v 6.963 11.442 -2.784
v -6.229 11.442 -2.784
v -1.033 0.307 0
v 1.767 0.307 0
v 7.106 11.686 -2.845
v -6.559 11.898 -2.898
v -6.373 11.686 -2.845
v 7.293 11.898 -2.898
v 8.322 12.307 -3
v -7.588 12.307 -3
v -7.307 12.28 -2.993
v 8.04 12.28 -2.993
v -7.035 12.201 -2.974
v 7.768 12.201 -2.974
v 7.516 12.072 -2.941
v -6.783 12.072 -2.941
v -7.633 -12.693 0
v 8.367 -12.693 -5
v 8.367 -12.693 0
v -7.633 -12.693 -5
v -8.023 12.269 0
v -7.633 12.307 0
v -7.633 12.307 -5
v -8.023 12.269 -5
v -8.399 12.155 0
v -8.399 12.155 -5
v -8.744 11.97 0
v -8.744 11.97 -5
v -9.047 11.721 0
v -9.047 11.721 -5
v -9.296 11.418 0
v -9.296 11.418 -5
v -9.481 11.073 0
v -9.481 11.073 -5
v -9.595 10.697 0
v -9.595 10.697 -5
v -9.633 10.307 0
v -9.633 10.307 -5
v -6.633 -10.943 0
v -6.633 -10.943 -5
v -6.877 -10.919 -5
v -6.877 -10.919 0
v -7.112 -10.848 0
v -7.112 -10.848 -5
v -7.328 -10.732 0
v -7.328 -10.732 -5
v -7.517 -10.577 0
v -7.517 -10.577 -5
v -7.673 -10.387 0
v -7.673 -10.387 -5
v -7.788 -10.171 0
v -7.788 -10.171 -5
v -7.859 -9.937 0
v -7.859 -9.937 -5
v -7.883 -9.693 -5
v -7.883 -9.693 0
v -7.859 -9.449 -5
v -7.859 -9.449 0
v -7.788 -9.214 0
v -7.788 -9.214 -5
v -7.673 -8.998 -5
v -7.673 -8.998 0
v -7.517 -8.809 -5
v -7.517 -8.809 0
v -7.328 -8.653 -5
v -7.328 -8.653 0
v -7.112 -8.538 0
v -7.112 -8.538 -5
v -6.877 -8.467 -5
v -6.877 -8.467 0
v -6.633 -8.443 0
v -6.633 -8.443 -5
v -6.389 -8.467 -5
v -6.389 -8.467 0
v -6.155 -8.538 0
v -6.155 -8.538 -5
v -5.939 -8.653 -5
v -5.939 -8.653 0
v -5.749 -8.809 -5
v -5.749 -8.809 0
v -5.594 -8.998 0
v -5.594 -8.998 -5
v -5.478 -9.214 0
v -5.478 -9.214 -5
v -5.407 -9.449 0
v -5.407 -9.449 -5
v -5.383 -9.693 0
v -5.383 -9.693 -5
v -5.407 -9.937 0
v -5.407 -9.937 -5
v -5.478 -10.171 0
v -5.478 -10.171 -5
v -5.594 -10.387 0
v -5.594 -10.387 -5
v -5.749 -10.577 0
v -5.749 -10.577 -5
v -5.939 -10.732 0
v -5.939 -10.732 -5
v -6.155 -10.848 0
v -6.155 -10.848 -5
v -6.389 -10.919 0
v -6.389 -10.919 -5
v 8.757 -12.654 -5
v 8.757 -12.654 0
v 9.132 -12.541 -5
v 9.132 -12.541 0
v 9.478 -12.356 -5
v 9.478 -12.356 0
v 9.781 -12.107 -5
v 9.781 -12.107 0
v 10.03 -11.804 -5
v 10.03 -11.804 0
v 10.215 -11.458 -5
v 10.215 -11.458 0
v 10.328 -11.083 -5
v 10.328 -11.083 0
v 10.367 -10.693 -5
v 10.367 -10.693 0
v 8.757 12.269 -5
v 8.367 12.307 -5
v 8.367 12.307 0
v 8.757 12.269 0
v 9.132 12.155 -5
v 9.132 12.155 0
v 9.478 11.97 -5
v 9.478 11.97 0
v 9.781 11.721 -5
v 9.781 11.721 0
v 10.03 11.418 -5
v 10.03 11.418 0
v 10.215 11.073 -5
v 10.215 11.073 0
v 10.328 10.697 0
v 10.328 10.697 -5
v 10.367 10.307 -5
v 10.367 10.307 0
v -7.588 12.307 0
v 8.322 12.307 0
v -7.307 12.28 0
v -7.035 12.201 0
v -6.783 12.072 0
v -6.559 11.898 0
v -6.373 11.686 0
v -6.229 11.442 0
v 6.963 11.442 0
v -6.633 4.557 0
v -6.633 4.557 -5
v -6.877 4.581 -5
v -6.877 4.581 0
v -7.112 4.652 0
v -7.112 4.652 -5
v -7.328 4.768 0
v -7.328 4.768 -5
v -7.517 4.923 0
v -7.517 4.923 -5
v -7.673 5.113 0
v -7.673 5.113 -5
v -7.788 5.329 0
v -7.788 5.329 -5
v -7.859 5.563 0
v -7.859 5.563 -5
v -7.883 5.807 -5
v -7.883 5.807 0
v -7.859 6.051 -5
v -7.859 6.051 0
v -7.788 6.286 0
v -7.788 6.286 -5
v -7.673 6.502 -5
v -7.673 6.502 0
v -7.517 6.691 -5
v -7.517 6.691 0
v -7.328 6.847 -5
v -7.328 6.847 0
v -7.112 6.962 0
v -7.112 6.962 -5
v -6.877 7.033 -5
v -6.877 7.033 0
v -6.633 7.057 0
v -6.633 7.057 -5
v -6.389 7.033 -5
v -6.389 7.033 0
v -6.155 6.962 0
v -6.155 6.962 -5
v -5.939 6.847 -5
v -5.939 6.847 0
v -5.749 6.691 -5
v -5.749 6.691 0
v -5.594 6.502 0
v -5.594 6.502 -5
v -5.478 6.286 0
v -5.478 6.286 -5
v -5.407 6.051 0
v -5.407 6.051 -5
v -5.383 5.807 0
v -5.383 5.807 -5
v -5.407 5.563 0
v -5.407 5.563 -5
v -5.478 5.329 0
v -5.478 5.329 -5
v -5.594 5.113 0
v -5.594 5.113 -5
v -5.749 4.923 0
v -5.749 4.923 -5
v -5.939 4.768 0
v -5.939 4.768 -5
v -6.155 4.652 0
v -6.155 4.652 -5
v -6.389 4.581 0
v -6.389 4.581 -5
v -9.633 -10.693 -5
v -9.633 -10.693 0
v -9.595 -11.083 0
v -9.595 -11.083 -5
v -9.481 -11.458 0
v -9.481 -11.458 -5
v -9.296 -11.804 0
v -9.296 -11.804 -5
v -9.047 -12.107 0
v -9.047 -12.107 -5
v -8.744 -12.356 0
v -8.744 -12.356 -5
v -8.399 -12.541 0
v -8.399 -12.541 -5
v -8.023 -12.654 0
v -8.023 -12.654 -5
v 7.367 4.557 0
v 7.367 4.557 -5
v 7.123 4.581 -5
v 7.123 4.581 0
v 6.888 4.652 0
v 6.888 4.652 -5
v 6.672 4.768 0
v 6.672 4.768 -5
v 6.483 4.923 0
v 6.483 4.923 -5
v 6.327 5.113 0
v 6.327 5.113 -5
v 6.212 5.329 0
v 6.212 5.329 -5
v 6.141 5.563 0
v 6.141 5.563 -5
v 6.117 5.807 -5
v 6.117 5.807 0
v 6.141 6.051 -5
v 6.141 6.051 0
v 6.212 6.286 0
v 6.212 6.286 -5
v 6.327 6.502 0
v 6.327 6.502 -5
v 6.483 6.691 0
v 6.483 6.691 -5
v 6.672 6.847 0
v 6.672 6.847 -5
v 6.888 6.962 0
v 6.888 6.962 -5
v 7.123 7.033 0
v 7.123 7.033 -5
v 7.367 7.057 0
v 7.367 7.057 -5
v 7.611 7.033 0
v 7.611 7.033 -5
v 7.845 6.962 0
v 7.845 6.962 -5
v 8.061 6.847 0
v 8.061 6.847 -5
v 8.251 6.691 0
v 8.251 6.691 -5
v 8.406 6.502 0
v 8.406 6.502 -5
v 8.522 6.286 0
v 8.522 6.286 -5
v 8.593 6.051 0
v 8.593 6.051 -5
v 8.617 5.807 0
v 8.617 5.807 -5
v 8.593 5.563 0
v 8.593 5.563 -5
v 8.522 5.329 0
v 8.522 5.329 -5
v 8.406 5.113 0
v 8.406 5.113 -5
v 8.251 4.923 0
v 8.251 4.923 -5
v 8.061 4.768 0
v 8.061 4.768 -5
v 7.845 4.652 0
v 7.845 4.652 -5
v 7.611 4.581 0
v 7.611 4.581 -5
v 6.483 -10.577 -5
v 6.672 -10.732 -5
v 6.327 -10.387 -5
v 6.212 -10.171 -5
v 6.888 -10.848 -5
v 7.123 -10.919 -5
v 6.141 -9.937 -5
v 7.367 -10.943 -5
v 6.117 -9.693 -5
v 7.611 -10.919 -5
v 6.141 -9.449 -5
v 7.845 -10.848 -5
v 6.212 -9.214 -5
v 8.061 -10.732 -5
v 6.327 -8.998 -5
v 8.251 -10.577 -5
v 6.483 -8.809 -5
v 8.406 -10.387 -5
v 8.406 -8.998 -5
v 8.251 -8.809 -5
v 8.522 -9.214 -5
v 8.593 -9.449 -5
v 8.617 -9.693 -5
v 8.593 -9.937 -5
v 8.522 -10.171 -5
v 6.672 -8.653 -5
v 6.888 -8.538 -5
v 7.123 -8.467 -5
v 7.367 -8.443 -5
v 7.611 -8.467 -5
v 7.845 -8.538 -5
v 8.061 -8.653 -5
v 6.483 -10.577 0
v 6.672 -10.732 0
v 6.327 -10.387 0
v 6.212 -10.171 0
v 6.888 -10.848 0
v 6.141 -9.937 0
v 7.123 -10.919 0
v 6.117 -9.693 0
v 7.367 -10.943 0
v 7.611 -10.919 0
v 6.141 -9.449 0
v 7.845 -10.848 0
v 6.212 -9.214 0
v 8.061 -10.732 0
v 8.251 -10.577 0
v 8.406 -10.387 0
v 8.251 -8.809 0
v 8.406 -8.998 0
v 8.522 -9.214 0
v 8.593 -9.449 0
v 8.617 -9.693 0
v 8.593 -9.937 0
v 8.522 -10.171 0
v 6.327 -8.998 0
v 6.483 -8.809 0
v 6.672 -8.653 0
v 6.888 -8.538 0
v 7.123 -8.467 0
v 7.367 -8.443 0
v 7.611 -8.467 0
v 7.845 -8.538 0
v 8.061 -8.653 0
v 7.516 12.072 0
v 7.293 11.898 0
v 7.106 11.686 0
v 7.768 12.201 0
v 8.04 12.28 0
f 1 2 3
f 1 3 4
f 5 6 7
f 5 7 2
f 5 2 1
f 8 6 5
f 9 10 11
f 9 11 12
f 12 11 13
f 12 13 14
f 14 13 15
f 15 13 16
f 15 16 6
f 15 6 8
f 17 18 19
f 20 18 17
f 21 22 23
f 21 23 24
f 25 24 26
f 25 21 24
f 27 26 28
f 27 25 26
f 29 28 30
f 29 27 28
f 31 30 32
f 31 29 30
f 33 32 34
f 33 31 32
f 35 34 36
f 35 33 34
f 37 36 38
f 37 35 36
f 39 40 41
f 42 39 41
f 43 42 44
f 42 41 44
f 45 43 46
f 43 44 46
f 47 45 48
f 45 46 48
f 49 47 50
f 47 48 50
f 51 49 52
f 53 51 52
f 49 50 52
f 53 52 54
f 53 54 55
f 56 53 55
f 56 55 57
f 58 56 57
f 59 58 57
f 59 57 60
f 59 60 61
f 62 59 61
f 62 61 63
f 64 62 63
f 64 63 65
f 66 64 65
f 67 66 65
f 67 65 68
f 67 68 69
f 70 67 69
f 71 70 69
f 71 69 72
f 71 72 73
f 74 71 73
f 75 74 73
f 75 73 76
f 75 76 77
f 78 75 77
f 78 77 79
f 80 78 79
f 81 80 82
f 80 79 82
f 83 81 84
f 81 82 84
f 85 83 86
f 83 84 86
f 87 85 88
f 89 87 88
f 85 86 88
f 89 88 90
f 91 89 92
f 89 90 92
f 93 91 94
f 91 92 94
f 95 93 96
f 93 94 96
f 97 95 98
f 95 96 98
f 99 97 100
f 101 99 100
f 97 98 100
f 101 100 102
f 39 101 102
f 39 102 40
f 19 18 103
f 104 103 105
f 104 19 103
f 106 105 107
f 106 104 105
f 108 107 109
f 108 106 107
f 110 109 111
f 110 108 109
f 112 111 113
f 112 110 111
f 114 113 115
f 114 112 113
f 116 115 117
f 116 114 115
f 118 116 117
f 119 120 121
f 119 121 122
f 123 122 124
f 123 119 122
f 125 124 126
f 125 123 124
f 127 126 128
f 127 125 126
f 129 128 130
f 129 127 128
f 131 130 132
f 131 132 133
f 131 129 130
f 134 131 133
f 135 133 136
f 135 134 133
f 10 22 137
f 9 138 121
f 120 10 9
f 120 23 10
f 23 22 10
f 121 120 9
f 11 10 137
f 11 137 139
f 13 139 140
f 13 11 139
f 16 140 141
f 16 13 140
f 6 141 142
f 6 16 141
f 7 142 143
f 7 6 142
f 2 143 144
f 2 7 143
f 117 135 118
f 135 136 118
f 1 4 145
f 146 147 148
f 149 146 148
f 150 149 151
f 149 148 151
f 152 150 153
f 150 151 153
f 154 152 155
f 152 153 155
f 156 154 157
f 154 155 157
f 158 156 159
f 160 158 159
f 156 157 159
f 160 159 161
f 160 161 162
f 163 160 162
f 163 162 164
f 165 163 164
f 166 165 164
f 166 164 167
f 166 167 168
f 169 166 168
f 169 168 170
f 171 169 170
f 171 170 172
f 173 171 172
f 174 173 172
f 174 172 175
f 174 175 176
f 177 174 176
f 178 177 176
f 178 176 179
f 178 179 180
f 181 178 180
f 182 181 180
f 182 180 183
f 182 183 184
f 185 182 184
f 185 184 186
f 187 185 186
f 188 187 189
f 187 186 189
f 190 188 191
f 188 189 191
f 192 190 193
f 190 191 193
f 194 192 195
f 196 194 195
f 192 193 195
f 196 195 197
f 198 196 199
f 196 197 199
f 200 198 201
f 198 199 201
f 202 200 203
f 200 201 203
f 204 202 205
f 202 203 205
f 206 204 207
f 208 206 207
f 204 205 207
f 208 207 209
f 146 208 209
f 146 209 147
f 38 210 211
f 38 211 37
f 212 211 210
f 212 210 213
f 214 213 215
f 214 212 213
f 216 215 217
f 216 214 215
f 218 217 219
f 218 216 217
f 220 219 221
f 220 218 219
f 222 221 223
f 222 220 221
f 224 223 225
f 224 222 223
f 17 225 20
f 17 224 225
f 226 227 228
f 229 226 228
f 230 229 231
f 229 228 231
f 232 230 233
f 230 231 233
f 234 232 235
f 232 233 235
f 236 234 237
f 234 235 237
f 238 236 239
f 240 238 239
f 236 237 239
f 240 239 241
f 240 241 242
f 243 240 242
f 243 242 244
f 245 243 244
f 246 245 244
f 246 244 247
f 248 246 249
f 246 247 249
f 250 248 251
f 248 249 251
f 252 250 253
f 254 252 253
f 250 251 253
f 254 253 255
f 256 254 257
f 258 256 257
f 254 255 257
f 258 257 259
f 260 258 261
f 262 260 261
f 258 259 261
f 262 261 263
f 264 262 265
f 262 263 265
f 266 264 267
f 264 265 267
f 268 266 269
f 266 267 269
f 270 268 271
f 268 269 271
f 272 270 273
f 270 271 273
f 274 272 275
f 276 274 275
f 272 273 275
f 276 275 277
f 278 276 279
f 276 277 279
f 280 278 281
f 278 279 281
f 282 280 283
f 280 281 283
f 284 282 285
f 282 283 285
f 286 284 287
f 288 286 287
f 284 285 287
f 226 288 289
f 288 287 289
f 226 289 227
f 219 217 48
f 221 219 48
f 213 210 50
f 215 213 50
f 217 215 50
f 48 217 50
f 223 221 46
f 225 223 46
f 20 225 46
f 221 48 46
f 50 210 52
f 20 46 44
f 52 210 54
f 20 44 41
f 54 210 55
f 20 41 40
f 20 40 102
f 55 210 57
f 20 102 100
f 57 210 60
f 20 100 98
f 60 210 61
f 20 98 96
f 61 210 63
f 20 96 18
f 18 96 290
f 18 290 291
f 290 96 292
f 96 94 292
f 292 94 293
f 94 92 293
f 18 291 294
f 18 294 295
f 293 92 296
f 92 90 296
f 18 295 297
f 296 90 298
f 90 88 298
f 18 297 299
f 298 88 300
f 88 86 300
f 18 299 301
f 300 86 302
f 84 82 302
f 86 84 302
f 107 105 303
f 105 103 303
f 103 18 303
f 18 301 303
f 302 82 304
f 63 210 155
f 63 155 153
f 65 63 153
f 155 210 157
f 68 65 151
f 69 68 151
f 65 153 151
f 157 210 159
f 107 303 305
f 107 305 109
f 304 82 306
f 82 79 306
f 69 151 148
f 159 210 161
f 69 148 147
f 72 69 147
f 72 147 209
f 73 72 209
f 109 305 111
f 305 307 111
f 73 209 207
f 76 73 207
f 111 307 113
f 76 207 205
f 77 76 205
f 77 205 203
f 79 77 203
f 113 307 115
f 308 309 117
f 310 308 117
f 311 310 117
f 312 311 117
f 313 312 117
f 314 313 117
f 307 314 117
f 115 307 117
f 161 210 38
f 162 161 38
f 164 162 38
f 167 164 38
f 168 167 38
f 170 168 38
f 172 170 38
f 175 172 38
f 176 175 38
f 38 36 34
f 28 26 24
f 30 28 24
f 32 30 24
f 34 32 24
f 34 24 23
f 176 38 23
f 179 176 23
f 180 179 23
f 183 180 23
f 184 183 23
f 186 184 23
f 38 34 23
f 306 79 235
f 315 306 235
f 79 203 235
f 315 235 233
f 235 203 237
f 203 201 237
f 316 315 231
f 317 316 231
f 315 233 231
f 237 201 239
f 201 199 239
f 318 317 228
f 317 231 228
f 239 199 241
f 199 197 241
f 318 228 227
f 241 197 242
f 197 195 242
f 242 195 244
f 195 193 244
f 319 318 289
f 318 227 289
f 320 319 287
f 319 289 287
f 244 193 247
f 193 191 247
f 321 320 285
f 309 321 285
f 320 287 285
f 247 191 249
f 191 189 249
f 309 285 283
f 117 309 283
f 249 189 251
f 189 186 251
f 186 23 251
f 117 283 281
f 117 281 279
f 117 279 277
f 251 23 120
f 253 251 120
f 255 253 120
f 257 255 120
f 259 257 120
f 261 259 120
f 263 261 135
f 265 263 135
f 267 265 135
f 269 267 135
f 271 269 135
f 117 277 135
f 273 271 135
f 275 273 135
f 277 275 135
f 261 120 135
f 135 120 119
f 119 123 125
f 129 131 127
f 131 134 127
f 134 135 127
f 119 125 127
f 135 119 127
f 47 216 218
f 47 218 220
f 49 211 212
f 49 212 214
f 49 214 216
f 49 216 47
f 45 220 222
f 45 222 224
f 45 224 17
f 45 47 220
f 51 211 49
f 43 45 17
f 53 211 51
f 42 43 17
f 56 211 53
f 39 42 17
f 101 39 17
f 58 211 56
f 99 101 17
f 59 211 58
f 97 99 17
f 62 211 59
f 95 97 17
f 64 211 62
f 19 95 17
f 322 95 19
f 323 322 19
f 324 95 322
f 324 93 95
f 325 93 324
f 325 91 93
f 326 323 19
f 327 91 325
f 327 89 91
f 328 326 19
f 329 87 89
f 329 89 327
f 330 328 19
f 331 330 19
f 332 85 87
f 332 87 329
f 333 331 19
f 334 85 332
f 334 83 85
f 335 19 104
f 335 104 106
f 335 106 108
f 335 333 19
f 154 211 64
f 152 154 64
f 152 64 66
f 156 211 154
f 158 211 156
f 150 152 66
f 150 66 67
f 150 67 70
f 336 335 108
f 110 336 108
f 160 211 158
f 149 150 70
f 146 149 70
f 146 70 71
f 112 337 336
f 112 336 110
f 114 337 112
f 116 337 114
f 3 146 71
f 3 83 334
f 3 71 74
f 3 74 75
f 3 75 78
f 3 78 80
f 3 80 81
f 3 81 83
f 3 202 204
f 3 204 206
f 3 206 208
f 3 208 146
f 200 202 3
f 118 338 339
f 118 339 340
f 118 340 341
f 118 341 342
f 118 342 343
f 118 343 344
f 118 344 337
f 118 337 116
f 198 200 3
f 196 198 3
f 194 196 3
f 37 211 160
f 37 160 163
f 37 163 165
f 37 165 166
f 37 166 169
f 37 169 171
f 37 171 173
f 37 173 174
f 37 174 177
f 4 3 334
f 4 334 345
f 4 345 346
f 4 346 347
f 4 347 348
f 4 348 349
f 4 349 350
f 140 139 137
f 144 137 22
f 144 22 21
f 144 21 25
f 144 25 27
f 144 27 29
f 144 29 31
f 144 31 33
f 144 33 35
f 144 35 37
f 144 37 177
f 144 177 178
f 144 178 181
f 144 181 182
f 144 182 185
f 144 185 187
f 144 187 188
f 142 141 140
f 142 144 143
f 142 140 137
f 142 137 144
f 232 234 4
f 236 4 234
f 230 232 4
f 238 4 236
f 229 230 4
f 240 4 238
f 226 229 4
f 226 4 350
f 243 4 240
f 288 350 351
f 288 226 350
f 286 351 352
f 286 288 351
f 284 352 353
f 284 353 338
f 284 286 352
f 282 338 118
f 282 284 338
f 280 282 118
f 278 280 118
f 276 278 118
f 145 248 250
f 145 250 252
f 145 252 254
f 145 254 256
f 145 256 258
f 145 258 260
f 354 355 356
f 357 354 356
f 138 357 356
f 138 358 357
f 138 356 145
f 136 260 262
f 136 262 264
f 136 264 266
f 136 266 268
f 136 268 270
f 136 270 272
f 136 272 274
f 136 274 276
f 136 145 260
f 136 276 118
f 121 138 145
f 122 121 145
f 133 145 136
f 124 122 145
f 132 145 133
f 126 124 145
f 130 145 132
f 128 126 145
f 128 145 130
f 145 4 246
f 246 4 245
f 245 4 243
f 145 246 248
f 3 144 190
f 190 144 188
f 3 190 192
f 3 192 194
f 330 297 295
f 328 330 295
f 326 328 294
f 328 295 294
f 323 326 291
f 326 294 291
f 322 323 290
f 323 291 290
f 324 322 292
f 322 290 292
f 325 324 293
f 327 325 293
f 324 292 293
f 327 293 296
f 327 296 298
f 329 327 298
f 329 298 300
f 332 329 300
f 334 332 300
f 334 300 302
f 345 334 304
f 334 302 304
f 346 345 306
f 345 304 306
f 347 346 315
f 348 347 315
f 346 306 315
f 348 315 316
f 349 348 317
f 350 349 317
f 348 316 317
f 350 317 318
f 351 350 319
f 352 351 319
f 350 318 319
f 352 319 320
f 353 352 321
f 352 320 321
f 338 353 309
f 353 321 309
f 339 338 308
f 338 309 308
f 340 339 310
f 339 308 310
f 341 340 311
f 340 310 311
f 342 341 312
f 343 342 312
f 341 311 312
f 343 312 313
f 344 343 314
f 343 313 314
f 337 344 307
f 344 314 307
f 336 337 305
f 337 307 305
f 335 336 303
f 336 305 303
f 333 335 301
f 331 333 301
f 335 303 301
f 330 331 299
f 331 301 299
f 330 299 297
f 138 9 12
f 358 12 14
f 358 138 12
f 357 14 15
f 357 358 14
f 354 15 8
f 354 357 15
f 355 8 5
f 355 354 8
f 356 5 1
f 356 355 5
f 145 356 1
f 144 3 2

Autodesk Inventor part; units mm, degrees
ref_plane "YZ Plane" through (0, 0, 0) normal (1, 0, 0) x (0, 1, 0)
ref_plane "XZ Plane" through (0, 0, 0) normal (0, 1, 0) x (-1, 0, 0)
ref_plane "XY Plane" through (0, 0, 0) normal (0, 0, 1) x (1, 0, 0)
sketch "Sketch1" plane through (0, 0, 0) normal (0, 0, 1) x (1, 0, 0)
  line L0 (-9.6332, 12.3072) -> (10.3668, 12.3072)
  line L1 (10.3668, 12.3072) -> (10.3668, -12.6928)
  line L2 (10.3668, -12.6928) -> (-9.6332, -12.6928)
  line L3 (-9.6332, -12.6928) -> (-9.6332, 12.3072)
  line L4 (-4.3832, -2.6928) -> (5.1168, -2.6928)
  line L5 (5.1168, -2.6928) -> (5.1168, -7.7928)
  line L6 (5.1168, -7.7928) -> (-4.3832, -7.7928)
  line L7 (-4.3832, -7.7928) -> (-4.3832, -2.6928)
  line L8 (-1.0332, -2.6928) -> (-1.0332, -7.7928)
  line L9 (1.7668, -2.6928) -> (1.7668, -7.7928)
  line L10 (-1.0332, -2.6928) -> (-1.0332, 0.3072)
  line L11 (1.7668, -2.6928) -> (1.7668, 0.3072)
  line L12 (-1.0332, 0.3072) -> (-6.6332, 12.3072)
  line L13 (1.7668, 0.3072) -> (7.3668, 12.3072)
  line L14 (-1.0332, -7.7928) -> (-1.0332, -12.6928)
  line L15 (1.7668, -7.7928) -> (1.7668, -12.6928)
  point P0 (0, 0)
  dimension "d0" = 20
  dimension "d1" = 25
  dimension "d2" = 3.35
  dimension "d3" = 3.35
  dimension "d4" = 2.8
  dimension "d5" = 5.1
  dimension "d6" = 5.25
  dimension "d7" = 9.5
  dimension "d9" = 15
  dimension "d10" = 4.9
  dimension "d11" = 3
  dimension "d12" = 3
  dimension "d13" = 3
  dimension "d14" = 3
extrude "Extrusion1" add sketch "Sketch1" along normal blind 3 contours L0 L12 L10 L4 L7 L6 L14 L2 L3 | L0 L1 L2 L15 L6 L5 L4 L11 L13
extrude "Extrusion2" add sketch "Sketch1" against normal blind 5
chamfer "Chamfer1" distance 12 distance2 3 1 edges at (0.3668, 12.3072, 0) measured on face at (-0.0999, 8.3072, 0)
sketch "Sketch3" plane through (0, 0, 3) normal (0, 0, 1) x (1, 0, 0)
  line L0 (-9.6332, 12.3072) -> (-9.6332, -12.6928) projected
  line L1 (-9.6332, -12.6928) -> (-1.0332, -12.6928) projected
  line L2 (-1.0332, -12.6928) -> (-1.0332, -7.7928) projected
  line L3 (-1.0332, -7.7928) -> (-4.3832, -7.7928) projected
  line L4 (-4.3832, -7.7928) -> (-4.3832, -2.6928) projected
  line L5 (-4.3832, -2.6928) -> (-1.0332, -2.6928) projected
  line L6 (-1.0332, -2.6928) -> (-1.0332, 0.3072) projected
  line L7 (-1.0332, 0.3072) -> (-6.6332, 12.3072) projected
  line L8 (-6.6332, 12.3072) -> (-9.6332, 12.3072) projected
  line L9 (10.3668, -12.6928) -> (10.3668, 12.3072) projected
  line L10 (10.3668, 12.3072) -> (7.3668, 12.3072) projected
  line L11 (7.3668, 12.3072) -> (1.7668, 0.3072) projected
  line L12 (1.7668, 0.3072) -> (1.7668, -2.6928) projected
  line L13 (1.7668, -2.6928) -> (5.1168, -2.6928) projected
  line L14 (5.1168, -2.6928) -> (5.1168, -7.7928) projected
  line L15 (5.1168, -7.7928) -> (1.7668, -7.7928) projected
  line L16 (1.7668, -7.7928) -> (1.7668, -12.6928) projected
  line L17 (1.7668, -12.6928) -> (10.3668, -12.6928) projected
  point P0 (0, 0)
  point P1 (-6.6332, 5.8072)
  point P2 (7.3668, 5.8072)
  point P3 (-6.6332, -9.6928)
  point P4 (7.3668, -9.6928)
  dimension "d24" = 25
  dimension "d25" = 6.5
  dimension "d26" = 3
  dimension "d27" = 4.9
  dimension "d28" = 3
  dimension "d29" = 3
  dimension "d37" = 5.25
  dimension "d38" = 3
  dimension "d39" = 3
hole "Hole1" at (-6.6332, 5.8072, 3) at (7.3668, 5.8072, 3) at (-6.6332, -9.6928, 3) at (7.3668, -9.6928, 3) direction (0, 0, -1) diameter 2.5 end through all
fillet "Fillet1" radius 1.5 2 edges at (-6.6332, 12.3072, 0) (7.3668, 12.3072, 0)
fillet "Fillet2" radius 2 4 edges at (-9.6332, 12.3072, -1) (10.3668, 12.3072, -1) (10.3668, -12.6928, -1) (-9.6332, -12.6928, -1)
sketch "Sketch4" plane through (0, 0, 3) normal (0, 0, 1) x (1, 0, 0)
  line L0 (-13.7185, 14.5378) -> (16.1134, 14.5378)
  line L1 (16.1134, 14.5378) -> (16.1134, -15.8403)
  line L2 (16.1134, -15.8403) -> (-13.7185, -15.8403)
  line L3 (-13.7185, -15.8403) -> (-13.7185, 14.5378)
  point P0 (0, 0)
extrude "Extrusion4" cut sketch "Sketch4" against normal blind 3
equation "\"d3\" = d2"
equation "\"d6\" = -0.5 * d7 + 0.5 * d0"
equation "\"d12\" = d11"
equation "\"d14\" = d13"
equation "\"d29\" = d28"
equation "\"d39\" = d38"
properties part number "3DP_PLA_Part_Detector_Top_Half" material "ABS Plastic"
